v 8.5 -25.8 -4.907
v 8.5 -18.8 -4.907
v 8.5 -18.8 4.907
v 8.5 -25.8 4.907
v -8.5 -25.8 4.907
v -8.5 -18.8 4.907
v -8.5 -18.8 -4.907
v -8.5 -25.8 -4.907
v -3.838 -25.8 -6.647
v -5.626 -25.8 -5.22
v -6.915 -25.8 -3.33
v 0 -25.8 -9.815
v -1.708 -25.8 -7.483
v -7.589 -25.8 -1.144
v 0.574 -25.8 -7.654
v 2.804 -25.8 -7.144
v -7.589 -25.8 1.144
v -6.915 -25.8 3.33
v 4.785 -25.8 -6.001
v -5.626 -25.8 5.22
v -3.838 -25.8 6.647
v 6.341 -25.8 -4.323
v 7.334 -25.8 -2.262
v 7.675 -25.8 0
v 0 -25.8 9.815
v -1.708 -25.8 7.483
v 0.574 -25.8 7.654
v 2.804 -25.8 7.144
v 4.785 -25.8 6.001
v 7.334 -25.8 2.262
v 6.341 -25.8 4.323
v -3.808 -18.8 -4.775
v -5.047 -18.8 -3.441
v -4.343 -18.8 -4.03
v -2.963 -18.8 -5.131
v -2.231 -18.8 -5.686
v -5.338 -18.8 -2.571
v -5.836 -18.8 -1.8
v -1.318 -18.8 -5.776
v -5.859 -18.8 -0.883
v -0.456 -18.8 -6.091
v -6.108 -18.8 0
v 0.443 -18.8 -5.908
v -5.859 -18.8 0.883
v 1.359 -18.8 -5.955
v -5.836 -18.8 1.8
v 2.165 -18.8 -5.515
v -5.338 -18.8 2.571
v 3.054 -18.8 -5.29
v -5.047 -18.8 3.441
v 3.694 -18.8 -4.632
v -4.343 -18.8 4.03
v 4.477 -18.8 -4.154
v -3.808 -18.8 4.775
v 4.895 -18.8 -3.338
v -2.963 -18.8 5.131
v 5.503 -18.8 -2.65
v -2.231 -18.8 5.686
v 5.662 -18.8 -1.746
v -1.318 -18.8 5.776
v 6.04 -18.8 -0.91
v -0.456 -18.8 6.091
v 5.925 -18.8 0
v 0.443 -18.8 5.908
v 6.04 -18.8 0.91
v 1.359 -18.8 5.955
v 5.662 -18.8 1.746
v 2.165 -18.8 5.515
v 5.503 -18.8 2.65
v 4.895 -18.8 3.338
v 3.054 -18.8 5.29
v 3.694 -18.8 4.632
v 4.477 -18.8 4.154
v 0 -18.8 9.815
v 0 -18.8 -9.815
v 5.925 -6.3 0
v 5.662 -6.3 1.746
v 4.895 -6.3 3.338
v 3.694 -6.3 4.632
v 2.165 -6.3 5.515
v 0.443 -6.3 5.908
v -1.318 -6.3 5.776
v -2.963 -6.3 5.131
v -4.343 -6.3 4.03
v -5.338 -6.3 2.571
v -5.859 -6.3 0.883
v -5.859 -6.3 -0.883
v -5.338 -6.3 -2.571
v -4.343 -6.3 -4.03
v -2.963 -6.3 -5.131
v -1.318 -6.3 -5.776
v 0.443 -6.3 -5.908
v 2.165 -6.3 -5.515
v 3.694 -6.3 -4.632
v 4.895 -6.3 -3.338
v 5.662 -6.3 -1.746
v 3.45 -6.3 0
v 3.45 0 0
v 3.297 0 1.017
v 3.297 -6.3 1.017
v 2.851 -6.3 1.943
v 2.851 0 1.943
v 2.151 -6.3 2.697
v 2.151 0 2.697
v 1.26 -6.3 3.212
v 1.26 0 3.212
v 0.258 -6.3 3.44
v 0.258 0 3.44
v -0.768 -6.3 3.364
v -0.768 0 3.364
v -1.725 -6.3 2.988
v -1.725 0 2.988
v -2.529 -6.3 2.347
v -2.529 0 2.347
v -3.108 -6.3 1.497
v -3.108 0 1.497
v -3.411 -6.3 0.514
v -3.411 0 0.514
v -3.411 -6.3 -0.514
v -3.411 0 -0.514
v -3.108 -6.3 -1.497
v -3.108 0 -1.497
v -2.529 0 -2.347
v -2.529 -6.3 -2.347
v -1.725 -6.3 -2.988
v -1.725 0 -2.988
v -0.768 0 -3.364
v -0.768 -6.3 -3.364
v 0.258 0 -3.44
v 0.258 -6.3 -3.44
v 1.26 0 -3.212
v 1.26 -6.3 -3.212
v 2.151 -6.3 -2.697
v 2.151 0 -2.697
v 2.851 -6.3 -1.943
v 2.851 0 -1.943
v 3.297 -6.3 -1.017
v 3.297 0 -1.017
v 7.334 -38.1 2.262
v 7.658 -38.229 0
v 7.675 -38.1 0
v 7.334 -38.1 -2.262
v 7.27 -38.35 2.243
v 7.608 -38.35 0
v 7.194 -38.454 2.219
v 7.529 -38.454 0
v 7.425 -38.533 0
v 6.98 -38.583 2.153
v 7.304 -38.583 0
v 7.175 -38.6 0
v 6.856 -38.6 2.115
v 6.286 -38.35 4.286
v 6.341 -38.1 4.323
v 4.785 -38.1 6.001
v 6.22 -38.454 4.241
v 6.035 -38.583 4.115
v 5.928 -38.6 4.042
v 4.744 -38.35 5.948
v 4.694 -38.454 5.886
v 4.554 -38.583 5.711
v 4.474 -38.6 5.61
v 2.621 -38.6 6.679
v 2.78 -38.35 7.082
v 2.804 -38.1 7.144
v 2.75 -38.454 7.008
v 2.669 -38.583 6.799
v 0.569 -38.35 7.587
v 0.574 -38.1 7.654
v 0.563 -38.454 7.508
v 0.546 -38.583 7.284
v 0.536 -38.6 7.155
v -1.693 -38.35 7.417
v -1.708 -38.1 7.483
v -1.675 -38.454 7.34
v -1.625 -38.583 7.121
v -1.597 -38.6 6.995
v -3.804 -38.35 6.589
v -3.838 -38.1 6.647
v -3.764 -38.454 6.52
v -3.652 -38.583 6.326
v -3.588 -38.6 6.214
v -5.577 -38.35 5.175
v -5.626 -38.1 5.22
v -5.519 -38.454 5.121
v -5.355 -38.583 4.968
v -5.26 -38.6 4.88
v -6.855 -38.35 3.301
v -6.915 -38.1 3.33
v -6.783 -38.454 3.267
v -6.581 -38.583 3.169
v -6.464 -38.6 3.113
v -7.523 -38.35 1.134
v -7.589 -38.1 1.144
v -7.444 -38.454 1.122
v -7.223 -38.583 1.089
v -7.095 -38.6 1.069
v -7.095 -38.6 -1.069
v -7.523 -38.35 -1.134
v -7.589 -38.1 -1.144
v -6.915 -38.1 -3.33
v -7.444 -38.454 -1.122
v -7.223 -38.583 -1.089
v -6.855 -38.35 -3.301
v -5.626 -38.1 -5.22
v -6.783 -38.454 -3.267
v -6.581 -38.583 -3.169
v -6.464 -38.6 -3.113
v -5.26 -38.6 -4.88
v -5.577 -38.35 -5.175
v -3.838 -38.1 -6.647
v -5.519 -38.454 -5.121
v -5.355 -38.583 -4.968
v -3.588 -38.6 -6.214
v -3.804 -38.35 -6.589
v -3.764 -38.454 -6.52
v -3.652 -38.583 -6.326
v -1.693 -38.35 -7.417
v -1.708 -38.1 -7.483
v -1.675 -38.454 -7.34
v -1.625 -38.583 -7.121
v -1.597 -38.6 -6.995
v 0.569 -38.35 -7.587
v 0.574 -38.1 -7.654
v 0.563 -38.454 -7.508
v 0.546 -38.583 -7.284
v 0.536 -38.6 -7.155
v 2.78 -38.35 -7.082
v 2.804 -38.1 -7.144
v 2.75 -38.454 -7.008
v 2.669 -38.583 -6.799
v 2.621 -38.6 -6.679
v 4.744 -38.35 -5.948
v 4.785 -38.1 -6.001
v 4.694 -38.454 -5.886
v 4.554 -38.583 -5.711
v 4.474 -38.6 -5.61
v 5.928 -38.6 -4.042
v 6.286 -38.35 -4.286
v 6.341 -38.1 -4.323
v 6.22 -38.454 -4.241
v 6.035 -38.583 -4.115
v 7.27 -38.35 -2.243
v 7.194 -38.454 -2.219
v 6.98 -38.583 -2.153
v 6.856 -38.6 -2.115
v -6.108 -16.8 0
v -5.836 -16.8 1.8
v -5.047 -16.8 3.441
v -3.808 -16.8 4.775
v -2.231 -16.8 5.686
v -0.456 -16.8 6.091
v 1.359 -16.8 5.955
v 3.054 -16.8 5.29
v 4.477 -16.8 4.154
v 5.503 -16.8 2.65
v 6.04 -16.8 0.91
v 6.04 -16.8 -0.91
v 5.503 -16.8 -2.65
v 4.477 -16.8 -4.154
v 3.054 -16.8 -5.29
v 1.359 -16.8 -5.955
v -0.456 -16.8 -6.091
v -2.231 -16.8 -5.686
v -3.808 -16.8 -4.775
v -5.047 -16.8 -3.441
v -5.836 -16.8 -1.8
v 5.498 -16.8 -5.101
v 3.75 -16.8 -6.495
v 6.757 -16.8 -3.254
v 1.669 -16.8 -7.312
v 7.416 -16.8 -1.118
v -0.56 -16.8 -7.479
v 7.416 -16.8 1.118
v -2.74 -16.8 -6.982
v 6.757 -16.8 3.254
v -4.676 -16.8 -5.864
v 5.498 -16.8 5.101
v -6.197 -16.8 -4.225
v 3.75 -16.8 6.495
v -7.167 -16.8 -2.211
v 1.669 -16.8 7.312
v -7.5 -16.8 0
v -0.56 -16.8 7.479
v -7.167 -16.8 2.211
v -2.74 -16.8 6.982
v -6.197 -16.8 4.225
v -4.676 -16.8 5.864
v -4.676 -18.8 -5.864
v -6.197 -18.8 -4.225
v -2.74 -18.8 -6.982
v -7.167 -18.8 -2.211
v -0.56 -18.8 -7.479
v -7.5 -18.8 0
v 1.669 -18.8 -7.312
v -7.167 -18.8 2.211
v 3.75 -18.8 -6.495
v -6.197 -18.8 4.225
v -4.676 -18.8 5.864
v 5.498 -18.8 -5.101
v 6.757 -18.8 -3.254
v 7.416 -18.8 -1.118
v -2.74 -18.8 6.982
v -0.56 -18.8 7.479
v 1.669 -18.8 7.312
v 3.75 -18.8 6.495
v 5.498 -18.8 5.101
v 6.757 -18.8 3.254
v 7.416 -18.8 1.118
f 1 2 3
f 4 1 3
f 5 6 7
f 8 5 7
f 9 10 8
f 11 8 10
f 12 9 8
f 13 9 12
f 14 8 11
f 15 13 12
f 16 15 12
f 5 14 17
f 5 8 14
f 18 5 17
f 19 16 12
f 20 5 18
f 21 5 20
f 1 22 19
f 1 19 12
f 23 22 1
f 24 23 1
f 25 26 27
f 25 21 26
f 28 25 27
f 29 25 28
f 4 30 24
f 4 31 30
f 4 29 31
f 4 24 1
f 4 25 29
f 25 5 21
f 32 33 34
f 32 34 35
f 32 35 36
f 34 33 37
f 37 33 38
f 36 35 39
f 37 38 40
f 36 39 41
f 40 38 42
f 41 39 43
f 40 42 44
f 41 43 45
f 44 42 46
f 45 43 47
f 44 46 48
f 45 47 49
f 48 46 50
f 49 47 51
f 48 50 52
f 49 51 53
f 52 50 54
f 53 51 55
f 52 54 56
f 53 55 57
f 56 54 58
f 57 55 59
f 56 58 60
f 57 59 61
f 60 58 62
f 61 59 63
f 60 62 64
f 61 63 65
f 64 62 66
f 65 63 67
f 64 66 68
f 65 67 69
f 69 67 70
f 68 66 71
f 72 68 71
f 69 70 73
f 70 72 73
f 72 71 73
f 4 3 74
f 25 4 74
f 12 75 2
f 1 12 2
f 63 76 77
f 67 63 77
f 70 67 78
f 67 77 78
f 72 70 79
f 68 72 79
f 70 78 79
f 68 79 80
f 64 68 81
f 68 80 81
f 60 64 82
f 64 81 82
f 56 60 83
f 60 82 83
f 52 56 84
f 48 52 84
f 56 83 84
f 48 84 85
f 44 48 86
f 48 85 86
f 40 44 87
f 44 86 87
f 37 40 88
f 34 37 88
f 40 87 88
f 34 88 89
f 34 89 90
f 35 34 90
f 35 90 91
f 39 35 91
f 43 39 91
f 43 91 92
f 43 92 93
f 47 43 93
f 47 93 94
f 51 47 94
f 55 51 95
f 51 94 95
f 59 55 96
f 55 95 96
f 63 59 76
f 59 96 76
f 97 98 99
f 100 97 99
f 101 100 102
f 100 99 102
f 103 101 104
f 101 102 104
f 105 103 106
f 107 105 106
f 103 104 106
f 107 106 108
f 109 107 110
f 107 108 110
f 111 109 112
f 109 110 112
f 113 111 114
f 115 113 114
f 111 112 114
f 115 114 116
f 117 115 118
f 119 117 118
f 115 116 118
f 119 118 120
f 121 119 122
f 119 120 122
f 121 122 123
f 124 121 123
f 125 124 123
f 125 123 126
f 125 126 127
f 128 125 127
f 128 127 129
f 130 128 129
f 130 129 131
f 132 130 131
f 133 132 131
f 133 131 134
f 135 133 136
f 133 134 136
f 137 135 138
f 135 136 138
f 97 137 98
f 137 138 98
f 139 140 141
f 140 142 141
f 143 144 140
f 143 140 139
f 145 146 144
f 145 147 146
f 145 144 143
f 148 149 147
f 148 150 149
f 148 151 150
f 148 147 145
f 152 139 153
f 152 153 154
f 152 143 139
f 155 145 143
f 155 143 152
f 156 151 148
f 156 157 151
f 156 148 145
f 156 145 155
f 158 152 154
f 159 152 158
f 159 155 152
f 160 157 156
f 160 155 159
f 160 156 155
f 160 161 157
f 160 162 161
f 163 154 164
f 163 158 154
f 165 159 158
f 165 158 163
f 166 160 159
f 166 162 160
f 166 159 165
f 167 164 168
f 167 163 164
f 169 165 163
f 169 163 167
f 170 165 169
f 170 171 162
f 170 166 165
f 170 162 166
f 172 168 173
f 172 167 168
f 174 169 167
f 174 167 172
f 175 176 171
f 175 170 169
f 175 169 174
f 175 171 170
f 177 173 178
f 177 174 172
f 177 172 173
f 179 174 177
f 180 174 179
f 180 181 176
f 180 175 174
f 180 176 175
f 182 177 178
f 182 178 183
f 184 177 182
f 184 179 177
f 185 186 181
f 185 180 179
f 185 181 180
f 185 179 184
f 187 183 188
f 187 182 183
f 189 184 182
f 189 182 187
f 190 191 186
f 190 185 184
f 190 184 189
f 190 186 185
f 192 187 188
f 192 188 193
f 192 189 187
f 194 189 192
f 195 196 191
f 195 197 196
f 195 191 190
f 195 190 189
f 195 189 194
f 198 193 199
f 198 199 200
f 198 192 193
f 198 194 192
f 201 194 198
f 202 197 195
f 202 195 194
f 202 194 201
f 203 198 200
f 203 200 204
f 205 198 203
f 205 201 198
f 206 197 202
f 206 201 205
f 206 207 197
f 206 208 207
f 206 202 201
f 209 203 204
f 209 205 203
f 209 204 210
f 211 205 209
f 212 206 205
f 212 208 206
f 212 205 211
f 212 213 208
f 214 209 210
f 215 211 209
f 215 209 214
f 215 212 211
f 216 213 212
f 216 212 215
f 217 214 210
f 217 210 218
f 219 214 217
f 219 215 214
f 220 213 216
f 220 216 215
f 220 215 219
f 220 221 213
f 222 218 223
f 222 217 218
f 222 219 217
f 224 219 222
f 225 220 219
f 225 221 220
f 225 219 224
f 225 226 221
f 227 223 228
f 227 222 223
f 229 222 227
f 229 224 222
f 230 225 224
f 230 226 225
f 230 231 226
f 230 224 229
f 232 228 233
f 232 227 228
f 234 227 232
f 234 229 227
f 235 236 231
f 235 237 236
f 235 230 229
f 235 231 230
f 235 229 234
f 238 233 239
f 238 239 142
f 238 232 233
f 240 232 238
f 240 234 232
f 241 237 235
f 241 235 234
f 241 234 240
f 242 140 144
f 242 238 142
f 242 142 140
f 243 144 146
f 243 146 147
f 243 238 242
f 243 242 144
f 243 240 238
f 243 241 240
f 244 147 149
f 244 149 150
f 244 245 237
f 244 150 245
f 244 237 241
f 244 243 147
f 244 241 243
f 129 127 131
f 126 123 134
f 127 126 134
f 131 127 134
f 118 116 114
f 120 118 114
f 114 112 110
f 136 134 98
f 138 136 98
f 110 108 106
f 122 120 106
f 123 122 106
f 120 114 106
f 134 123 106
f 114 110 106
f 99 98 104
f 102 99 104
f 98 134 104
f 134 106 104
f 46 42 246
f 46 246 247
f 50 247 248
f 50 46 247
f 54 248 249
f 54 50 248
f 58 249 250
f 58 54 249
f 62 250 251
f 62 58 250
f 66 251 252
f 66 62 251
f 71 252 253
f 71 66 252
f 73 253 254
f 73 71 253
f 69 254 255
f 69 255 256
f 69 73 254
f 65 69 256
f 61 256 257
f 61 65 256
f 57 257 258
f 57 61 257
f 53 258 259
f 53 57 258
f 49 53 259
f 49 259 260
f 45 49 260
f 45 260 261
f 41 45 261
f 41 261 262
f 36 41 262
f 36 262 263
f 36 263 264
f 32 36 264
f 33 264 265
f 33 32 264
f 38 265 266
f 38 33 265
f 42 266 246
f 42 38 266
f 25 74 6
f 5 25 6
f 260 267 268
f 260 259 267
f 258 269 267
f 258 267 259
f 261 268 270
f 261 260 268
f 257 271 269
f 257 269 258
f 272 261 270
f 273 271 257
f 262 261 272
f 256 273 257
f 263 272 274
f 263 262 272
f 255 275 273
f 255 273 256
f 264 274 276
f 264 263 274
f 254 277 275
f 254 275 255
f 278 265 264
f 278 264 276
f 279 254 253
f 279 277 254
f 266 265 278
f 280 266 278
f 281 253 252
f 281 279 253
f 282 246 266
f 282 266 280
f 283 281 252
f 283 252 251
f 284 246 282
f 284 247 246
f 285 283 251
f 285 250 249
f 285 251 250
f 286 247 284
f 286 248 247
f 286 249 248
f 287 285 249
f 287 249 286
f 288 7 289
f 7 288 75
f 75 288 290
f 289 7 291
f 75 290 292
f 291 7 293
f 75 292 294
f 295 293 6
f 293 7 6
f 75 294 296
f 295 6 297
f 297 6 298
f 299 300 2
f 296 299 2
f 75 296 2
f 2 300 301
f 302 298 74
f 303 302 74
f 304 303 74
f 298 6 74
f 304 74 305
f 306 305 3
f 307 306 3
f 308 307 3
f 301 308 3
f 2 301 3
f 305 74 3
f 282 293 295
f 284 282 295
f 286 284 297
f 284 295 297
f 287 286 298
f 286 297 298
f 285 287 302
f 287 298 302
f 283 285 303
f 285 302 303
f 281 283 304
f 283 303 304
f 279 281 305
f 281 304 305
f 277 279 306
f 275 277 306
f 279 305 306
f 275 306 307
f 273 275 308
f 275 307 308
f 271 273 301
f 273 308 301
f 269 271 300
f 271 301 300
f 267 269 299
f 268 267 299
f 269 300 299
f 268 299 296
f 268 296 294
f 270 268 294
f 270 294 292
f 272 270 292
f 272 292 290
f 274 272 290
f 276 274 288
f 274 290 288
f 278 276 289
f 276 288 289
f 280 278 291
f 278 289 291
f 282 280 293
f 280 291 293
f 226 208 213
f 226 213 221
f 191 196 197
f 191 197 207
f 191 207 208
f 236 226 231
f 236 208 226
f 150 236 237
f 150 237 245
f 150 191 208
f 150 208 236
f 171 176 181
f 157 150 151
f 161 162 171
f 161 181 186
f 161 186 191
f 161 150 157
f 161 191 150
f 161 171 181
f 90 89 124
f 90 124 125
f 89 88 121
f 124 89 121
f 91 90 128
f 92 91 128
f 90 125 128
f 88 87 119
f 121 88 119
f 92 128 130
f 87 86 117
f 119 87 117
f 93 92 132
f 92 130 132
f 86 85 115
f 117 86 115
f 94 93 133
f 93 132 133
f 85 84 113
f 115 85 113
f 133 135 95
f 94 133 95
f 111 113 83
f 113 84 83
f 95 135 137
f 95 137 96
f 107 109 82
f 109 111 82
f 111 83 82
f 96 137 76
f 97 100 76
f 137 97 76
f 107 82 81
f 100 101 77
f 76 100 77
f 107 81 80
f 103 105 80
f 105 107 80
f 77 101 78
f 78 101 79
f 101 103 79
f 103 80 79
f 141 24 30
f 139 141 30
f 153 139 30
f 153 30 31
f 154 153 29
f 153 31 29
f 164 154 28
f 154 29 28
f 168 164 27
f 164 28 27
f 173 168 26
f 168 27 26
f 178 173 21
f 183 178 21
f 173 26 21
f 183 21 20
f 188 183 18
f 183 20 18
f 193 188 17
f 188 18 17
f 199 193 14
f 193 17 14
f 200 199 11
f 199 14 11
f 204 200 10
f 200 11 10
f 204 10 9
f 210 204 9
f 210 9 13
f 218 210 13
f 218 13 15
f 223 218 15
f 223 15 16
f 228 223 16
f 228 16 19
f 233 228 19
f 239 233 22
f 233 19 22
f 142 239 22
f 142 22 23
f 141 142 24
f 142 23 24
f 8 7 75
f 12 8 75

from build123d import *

# Parameters (mm, degrees)
F0_R      = 3.45
F1_DEPTH  = 6.3
F2_R      = 5.925
F3_DEPTH  = 12.5
F5_DEPTH  = 7
F6_R      = 7.675
F7_DEPTH  = 12.8
F8_R      = 0.5
F9_R      = 7.5
F9_R_2    = 6.107803
F10_DEPTH = 2


with BuildPart() as f1:
    # F0 (on Front) → F1 (new body)
    with BuildSketch(Plane.XZ):
        Circle(F0_R)
    extrude(amount=F1_DEPTH)

    # F2 (on face) → F3 (join)
    with BuildSketch(Plane.XZ.offset(6.3)):
        Circle(F2_R)
    extrude(amount=F3_DEPTH)

    # F4 (on face) → F5 (join)
    with BuildSketch(Plane.XZ.offset(18.8)):
        Polygon((0, 9.814955), (-8.5, 4.907477), (-8.5, -4.907477), (0, -9.814955), (8.5, -4.907477), (8.5, 4.907477), align=None)
    extrude(amount=F5_DEPTH)

    # F6 (on face) → F7 (join)
    with BuildSketch(Plane.XZ.offset(25.8)):
        Circle(F6_R)
    extrude(amount=F7_DEPTH)

    # F8
    f8_edges = [f1.edges().sort_by_distance(p)[0] for p in [
        (-7.675, -38.6, 0),
    ]]
    fillet(f8_edges, radius=F8_R)

    # F9 (on face) → F10 (join)
    with BuildSketch(Plane(origin=(0, -18.8, 0), x_dir=(-1, 0, 0), z_dir=(0, 1, 0))):
        Circle(F9_R)
        Circle(F9_R_2, mode=Mode.SUBTRACT)
    extrude(amount=F10_DEPTH)


solid = f1.part
